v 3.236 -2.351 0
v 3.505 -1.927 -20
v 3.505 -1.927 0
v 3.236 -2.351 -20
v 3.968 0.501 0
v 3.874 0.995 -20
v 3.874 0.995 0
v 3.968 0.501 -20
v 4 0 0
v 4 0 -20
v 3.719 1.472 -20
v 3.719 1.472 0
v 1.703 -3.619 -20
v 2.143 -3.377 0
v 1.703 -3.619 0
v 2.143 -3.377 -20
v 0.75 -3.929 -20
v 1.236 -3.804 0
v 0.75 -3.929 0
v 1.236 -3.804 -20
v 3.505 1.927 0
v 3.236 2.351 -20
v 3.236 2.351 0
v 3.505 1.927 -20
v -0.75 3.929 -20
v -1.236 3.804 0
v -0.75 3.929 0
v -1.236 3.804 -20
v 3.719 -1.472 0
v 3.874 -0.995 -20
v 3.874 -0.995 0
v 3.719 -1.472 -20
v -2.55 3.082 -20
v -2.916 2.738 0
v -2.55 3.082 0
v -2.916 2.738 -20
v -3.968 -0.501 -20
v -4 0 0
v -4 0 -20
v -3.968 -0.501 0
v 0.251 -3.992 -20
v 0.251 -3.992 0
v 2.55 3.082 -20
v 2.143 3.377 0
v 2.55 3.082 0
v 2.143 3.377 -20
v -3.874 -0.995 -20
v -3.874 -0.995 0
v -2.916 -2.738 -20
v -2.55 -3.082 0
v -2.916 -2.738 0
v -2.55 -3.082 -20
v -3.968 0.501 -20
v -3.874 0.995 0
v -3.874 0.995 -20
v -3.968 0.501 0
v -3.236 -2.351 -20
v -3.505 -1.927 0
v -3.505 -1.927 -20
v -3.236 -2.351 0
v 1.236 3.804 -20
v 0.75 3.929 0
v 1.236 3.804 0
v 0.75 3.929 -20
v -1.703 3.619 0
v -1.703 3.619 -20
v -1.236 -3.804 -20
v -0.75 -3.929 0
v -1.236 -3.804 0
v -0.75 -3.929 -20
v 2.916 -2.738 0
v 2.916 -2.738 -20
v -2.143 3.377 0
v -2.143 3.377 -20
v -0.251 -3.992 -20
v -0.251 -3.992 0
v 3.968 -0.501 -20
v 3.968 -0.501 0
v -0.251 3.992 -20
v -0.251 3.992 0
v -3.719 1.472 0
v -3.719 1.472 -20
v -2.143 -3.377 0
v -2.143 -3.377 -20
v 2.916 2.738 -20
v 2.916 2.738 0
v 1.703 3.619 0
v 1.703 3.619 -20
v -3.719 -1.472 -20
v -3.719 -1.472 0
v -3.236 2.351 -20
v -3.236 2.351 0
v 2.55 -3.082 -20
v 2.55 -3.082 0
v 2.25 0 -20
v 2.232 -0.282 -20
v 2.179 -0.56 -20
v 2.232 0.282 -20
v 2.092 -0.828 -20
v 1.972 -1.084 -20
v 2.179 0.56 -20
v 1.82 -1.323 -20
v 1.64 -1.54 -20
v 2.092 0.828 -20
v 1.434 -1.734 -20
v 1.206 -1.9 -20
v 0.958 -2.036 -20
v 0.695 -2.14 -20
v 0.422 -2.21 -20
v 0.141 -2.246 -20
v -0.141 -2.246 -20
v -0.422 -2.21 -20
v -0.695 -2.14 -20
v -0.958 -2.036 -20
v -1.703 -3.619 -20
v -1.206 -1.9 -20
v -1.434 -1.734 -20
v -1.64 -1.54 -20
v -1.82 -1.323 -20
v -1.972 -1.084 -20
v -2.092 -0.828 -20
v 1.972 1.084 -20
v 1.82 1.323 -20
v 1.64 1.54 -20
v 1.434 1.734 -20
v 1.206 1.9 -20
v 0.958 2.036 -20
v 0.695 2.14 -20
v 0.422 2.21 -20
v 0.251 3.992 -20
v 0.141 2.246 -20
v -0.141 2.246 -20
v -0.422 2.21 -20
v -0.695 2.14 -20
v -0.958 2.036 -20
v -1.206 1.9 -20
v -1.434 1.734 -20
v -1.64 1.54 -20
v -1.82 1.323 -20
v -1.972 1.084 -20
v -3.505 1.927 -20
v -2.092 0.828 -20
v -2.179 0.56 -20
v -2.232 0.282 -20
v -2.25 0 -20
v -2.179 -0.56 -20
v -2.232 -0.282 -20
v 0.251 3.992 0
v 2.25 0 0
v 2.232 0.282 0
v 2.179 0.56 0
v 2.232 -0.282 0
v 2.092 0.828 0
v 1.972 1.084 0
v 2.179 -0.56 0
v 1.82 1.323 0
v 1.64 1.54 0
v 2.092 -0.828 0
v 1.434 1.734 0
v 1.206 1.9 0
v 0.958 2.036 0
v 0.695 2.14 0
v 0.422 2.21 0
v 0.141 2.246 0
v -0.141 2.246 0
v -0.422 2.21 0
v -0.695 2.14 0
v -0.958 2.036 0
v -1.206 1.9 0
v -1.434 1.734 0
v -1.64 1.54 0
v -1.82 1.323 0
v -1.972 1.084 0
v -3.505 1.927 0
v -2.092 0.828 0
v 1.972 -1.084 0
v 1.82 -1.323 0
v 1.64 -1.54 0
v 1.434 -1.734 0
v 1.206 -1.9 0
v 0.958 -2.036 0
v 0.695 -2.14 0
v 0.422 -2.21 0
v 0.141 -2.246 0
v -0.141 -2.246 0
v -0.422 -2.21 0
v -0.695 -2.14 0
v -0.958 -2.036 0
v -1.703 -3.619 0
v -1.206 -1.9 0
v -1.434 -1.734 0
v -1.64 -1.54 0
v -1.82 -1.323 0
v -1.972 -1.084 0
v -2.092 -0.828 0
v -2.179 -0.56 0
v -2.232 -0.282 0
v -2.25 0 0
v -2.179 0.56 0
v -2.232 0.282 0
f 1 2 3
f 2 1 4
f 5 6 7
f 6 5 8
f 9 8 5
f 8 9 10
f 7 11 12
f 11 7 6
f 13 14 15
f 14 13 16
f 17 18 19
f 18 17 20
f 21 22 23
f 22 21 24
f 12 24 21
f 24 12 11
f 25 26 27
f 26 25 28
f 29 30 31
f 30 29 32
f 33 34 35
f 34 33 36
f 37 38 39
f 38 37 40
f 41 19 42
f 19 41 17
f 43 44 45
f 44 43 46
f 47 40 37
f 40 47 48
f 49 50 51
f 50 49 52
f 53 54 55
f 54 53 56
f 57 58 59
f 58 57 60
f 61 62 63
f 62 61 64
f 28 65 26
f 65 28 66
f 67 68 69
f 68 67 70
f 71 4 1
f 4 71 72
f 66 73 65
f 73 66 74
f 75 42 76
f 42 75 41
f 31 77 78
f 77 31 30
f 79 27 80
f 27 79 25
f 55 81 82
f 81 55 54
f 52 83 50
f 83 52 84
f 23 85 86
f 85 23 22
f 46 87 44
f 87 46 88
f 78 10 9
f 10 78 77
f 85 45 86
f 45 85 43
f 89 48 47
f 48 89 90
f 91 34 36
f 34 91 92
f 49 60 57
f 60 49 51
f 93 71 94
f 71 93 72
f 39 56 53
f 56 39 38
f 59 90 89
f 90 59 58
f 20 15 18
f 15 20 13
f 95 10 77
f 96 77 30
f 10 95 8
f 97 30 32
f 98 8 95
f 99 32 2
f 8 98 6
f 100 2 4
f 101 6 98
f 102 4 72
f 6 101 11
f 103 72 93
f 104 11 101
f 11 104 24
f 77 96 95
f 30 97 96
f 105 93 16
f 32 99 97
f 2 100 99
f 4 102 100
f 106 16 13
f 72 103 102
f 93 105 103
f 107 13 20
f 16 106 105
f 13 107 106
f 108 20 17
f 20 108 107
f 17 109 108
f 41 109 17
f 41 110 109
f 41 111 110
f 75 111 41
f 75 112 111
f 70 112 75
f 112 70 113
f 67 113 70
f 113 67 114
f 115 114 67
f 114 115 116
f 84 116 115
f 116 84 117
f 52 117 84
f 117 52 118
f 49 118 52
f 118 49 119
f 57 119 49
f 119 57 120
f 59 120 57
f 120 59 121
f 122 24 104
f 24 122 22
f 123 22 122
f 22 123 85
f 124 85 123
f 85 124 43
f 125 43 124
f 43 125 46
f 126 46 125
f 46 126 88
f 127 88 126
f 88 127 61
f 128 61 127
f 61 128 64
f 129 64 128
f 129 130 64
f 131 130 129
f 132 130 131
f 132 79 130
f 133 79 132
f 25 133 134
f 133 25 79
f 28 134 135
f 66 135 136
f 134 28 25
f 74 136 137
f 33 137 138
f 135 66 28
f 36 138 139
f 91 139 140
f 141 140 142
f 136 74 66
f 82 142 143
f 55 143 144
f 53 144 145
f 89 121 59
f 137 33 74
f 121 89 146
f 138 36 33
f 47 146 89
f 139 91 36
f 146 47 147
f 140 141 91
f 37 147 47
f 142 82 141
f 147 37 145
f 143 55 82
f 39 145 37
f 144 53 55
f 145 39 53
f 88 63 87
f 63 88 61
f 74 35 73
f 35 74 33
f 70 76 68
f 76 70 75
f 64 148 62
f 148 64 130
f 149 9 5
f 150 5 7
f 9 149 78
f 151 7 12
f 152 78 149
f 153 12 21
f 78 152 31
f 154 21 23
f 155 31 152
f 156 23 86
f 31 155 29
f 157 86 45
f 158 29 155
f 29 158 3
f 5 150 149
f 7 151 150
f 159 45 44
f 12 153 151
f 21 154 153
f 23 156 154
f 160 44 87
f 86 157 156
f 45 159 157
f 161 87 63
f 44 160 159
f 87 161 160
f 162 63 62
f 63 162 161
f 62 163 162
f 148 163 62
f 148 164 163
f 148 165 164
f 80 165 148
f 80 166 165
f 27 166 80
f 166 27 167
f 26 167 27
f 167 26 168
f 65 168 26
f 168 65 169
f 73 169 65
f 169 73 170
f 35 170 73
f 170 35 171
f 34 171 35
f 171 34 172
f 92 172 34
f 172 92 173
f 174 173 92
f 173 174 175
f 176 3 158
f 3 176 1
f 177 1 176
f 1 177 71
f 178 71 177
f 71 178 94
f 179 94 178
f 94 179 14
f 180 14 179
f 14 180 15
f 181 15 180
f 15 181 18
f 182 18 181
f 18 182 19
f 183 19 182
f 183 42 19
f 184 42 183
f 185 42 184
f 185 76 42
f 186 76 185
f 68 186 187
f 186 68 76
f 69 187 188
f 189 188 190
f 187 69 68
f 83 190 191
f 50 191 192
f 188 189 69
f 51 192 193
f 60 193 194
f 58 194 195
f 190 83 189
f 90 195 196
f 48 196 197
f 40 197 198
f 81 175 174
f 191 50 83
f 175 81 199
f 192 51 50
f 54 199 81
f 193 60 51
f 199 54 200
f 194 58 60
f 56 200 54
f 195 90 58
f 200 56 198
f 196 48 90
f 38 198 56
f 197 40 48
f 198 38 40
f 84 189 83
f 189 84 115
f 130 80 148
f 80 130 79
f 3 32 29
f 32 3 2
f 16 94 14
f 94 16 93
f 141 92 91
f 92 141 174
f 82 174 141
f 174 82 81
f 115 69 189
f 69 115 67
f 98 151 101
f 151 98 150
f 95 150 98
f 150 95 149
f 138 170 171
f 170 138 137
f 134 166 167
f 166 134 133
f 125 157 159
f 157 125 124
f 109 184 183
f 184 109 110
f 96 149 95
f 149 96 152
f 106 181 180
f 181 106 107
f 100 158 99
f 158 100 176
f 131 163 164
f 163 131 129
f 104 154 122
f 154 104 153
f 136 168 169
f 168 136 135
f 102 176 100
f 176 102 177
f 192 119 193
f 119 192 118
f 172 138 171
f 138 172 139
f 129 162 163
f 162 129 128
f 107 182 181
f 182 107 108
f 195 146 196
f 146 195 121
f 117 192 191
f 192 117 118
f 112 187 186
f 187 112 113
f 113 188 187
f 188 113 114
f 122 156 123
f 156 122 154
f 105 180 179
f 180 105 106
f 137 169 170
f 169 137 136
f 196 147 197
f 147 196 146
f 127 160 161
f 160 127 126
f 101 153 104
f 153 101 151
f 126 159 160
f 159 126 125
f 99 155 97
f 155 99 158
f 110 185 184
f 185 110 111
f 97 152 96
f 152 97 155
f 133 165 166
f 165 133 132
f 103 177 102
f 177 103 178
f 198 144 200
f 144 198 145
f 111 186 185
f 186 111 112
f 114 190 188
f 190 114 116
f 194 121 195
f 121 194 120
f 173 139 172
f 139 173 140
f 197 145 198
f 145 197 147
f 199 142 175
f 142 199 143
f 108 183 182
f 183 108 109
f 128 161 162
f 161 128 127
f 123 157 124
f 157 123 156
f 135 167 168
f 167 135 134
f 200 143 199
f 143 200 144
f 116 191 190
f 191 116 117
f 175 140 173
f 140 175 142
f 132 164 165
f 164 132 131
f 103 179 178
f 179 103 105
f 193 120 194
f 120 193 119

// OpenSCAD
$fn = 50;


difference() {
	union() {
		translate(v = [0, 0, -20.0000000000]) {
			cylinder(h = 20, r = 4.0000000000);
		}
		cylinder(h = 0, r = 7.0000000000);
	}
	union() {
		#translate(v = [0, 0, -20]) {
			cylinder(h = 20, r = 2.2500000000);
		}
	}
}
